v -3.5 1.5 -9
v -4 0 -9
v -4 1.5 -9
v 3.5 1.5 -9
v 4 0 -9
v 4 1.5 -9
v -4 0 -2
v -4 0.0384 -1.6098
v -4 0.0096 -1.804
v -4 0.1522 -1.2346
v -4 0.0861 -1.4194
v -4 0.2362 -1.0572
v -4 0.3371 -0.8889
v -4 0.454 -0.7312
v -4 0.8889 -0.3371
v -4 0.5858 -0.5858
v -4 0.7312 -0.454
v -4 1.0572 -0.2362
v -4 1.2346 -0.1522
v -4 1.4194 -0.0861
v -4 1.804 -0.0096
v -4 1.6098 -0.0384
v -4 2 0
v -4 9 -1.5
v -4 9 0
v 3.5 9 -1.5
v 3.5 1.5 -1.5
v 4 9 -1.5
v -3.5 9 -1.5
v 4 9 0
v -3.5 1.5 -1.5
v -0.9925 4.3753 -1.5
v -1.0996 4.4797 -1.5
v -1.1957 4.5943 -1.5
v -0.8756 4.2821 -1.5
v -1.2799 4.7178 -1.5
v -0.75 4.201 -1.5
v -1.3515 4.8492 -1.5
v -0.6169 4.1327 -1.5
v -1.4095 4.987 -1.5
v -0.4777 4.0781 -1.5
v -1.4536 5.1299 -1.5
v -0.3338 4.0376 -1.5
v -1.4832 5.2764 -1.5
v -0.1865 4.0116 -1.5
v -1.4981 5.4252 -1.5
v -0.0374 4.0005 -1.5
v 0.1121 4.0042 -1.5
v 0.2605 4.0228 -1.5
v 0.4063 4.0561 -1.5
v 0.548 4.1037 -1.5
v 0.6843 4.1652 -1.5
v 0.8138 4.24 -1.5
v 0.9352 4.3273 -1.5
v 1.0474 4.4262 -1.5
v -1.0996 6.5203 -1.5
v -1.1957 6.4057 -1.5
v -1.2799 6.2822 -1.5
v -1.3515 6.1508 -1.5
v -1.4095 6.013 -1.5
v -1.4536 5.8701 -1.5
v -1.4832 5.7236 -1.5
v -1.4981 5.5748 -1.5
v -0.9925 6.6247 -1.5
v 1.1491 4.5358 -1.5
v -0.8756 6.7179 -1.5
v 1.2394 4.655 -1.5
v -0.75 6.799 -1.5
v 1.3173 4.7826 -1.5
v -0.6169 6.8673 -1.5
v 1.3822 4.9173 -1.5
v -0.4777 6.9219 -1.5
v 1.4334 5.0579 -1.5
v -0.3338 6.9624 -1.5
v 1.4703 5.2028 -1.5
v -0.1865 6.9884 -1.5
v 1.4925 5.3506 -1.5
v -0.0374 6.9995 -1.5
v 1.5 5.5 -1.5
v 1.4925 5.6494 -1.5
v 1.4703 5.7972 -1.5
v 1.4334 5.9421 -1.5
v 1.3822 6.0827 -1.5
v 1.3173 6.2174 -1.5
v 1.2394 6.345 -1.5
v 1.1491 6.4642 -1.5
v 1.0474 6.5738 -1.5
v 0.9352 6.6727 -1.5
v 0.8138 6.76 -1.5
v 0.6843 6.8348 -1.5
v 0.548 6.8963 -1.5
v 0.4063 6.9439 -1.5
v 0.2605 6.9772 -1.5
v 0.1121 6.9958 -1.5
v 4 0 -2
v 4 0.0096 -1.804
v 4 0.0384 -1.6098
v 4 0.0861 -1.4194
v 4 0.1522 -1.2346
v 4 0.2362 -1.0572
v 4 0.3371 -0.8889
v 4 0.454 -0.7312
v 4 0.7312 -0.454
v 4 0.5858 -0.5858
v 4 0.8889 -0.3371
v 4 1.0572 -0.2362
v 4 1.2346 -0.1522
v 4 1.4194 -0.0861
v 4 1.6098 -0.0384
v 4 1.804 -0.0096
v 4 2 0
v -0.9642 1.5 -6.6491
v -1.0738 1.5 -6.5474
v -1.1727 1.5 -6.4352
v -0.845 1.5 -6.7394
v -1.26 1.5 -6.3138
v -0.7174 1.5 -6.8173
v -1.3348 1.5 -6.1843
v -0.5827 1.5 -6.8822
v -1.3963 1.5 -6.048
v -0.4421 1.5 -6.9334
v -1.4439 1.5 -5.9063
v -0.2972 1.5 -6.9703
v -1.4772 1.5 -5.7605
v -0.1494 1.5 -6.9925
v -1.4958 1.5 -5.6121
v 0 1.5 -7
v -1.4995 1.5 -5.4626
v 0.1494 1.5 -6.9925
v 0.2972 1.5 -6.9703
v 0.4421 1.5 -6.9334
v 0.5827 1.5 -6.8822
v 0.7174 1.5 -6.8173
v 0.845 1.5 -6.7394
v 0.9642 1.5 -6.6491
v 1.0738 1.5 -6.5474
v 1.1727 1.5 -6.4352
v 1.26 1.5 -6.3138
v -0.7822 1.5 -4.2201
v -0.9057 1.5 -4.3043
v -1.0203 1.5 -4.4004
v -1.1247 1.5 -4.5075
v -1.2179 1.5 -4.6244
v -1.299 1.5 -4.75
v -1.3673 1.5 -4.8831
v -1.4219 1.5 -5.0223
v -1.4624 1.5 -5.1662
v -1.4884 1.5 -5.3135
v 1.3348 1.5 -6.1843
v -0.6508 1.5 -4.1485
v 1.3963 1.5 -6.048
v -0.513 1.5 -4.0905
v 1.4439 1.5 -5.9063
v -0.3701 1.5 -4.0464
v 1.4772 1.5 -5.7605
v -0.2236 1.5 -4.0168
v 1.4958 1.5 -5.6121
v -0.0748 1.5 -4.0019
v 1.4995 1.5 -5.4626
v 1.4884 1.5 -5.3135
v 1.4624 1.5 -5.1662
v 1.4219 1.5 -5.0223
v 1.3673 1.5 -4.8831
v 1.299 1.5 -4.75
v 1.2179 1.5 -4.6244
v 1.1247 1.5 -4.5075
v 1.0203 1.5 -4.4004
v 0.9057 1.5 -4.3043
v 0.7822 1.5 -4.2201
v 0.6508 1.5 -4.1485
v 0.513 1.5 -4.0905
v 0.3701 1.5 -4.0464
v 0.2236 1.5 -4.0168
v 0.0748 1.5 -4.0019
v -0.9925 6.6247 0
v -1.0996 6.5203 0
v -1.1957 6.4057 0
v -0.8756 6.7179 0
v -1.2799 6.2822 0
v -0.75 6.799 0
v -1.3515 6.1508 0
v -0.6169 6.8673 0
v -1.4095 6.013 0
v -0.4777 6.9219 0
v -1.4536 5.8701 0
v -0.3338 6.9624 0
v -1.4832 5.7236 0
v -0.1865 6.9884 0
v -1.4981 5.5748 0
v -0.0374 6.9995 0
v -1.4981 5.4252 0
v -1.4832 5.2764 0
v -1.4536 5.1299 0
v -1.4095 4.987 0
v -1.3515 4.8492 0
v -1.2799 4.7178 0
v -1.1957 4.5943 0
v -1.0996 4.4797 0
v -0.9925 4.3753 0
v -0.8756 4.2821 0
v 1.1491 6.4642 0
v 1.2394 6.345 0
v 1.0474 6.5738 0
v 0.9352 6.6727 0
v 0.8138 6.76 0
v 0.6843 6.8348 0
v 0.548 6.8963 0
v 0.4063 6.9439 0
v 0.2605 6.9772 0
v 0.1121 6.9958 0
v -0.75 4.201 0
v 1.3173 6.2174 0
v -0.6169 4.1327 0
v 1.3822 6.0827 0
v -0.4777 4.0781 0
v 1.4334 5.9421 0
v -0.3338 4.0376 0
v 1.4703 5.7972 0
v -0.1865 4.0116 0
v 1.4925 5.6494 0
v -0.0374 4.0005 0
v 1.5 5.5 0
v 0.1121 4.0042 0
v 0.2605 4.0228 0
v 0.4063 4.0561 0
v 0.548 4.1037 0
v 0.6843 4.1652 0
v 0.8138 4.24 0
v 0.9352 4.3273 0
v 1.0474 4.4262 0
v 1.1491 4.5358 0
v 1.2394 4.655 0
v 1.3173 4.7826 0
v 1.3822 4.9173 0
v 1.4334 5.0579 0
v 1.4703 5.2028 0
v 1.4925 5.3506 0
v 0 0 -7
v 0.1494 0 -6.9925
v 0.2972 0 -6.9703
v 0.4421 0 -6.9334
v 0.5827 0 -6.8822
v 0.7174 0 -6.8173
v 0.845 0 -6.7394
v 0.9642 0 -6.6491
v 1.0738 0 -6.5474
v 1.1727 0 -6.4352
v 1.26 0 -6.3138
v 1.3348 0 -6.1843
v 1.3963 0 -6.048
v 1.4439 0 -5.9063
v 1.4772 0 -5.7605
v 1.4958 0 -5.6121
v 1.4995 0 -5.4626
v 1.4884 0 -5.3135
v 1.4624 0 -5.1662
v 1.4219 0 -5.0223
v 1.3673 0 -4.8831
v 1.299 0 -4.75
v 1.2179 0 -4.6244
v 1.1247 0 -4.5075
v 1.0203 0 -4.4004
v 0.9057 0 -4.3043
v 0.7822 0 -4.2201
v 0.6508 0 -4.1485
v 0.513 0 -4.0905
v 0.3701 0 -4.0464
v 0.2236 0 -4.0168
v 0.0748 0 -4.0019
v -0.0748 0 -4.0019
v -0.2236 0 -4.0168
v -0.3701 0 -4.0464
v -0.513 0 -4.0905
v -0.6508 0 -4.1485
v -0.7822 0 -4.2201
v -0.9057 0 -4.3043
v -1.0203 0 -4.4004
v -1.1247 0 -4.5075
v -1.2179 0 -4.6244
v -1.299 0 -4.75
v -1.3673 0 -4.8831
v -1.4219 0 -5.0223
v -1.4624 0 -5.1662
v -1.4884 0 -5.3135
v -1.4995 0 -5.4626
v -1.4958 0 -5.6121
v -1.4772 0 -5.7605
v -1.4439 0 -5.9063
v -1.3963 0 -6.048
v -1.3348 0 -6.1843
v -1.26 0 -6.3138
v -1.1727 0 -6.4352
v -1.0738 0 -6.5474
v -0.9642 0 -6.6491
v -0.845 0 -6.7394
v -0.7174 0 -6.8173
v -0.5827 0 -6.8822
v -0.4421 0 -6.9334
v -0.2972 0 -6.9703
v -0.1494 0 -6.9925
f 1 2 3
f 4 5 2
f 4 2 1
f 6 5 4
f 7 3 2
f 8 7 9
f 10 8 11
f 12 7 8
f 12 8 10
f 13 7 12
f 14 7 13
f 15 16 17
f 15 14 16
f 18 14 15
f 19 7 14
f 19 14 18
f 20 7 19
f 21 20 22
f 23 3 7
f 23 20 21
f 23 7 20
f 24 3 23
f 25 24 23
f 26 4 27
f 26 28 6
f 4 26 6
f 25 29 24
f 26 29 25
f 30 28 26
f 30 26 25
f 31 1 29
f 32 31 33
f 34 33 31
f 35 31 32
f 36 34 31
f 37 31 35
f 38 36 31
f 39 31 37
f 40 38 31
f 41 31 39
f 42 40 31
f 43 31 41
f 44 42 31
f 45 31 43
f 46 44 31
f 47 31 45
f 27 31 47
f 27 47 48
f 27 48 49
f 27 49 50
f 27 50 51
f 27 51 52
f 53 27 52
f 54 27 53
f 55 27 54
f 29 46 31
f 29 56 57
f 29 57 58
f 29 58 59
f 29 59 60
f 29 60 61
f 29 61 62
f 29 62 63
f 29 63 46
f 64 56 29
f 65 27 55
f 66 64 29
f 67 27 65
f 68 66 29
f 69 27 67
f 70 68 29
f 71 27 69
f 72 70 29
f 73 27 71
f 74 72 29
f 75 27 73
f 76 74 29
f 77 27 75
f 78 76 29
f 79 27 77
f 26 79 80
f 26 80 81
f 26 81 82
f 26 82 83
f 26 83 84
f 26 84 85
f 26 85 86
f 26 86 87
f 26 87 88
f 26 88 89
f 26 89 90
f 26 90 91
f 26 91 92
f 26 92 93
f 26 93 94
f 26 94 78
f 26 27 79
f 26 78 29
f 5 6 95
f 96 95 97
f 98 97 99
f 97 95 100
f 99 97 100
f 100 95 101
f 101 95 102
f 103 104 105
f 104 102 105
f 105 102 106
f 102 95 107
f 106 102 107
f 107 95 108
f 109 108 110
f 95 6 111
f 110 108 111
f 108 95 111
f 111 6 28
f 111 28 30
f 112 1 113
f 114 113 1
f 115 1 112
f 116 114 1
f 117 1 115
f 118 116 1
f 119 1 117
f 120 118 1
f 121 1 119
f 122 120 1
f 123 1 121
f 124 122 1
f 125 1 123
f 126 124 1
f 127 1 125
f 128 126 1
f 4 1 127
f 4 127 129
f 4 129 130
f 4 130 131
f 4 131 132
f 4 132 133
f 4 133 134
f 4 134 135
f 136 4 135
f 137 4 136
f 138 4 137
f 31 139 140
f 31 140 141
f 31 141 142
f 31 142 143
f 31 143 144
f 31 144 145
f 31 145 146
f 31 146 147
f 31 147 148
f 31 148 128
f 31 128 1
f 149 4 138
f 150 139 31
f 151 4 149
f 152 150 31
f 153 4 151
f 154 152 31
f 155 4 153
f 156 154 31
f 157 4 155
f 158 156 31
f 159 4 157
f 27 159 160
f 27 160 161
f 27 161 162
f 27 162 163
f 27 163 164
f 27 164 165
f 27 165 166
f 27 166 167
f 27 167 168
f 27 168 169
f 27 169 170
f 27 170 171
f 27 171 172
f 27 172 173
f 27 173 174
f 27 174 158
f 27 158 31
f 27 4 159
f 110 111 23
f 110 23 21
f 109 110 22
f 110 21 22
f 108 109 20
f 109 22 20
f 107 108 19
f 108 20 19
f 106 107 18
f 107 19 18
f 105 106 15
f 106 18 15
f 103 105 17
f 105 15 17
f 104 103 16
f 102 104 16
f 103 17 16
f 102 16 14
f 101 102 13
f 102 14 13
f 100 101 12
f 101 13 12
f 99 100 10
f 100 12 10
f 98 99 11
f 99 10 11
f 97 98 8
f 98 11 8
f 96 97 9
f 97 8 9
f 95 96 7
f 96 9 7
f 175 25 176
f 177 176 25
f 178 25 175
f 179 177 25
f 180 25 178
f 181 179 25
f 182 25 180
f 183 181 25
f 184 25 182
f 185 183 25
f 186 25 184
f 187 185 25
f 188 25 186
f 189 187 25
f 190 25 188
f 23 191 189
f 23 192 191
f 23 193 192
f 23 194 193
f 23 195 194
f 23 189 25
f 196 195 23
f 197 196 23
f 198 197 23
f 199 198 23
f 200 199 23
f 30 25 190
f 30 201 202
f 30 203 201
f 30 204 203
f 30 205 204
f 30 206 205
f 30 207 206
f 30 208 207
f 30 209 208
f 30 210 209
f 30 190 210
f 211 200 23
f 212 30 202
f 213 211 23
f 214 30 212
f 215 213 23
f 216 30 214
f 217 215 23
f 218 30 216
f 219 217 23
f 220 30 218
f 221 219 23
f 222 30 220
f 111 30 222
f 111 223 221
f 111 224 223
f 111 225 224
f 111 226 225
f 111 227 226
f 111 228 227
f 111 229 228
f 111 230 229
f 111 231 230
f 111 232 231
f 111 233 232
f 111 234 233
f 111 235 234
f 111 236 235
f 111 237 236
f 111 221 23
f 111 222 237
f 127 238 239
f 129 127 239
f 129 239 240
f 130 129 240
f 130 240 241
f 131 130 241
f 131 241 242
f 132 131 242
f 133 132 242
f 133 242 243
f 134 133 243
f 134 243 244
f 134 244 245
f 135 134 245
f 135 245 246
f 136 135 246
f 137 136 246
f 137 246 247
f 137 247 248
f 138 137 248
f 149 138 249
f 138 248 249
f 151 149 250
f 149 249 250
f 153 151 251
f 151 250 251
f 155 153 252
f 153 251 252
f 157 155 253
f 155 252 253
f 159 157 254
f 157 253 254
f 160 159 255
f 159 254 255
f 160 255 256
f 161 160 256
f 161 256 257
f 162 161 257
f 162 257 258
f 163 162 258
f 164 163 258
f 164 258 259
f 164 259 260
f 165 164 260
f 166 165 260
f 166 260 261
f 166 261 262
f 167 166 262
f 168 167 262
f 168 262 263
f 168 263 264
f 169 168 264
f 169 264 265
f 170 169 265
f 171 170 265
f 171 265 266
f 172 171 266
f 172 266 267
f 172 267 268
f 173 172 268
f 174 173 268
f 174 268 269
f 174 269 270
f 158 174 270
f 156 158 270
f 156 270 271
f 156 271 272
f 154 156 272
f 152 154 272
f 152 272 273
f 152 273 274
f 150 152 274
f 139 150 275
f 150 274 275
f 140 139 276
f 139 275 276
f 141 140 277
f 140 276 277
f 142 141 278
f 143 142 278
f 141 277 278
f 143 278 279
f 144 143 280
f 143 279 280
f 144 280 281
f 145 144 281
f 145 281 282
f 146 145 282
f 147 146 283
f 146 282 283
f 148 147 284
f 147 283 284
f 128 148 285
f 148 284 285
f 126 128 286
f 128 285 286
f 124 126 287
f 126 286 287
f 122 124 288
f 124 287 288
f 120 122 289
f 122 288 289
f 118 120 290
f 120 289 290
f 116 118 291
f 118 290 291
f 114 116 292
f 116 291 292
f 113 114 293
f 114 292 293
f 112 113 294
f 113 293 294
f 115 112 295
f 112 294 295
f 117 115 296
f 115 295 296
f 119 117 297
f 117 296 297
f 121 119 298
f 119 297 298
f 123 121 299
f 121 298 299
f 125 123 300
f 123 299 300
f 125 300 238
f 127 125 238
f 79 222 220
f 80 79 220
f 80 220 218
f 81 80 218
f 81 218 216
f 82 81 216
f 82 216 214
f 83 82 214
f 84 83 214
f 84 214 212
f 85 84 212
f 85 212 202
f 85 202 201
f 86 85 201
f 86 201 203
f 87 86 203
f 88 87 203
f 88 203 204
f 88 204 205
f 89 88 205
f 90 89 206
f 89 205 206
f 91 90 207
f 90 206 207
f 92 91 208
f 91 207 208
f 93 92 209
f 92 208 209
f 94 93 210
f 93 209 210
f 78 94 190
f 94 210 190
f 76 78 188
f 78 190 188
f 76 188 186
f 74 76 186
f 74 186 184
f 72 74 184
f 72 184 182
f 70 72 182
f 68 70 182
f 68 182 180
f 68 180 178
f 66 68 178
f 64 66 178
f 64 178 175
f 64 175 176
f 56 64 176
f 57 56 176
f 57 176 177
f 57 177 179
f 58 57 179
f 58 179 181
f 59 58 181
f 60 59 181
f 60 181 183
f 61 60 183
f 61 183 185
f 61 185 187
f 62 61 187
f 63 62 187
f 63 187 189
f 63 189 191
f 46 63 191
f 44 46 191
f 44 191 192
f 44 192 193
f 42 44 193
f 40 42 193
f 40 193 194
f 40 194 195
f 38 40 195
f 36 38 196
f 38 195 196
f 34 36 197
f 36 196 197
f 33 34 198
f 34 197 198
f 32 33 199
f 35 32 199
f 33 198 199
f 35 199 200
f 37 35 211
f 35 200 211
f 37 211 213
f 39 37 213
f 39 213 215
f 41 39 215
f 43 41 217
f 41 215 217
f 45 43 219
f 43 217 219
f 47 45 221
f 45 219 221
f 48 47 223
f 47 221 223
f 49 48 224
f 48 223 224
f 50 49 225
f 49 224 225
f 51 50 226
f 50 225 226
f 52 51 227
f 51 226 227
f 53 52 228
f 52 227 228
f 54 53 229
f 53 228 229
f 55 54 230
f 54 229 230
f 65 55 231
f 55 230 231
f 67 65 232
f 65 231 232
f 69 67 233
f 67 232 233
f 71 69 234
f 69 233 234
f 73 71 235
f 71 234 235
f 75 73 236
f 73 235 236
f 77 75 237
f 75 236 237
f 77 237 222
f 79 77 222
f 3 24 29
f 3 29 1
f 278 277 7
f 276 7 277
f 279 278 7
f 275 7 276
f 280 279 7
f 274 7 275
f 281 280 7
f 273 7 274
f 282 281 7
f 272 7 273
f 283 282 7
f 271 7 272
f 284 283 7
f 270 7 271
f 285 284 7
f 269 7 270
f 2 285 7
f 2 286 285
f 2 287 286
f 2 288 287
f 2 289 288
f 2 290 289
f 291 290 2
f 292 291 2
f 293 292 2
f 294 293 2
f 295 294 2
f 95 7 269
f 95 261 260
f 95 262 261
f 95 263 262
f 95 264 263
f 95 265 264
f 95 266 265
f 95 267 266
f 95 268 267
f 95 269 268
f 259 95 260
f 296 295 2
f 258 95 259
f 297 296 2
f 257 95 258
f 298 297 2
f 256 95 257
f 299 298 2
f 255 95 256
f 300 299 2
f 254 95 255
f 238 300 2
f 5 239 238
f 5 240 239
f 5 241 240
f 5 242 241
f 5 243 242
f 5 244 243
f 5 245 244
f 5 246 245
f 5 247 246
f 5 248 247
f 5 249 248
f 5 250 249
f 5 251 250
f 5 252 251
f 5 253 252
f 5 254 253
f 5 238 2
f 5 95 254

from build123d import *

# Parameters (mm, degrees)
BOSS_EXTRUDE1_DEPTH = 4
BOSS_EXTRUDE2_DEPTH = 0.5
SKETCH3_R           = 1.5
CUT_EXTRUDE1_DEPTH  = 14.341664064
SKETCH4_R           = 1.5
CUT_EXTRUDE2_DEPTH  = 14.341664064
FILLET1_R           = 2


with BuildPart() as part:
    # Sketch1 → Boss-Extrude1 (new, symmetric)
    with BuildSketch(Plane(origin=(0, 0, 0), x_dir=(0, 0, -1), z_dir=(1, 0, 0))):
        Polygon((0, 1.664846908), (0, 0), (1.75206606, 0), (9, 0), (9, 1.5), (1.5, 1.5), (1.5, 9), (0, 9), align=None)
    extrude(amount=BOSS_EXTRUDE1_DEPTH, both=True)

    # Sketch2 → Boss-Extrude2 (add)
    with BuildSketch(Plane(origin=(4, 0, 0), x_dir=(0, 0, -1), z_dir=(1, 0, 0))):
        Polygon((1.5, 9), (9, 1.5), (1.5, 1.5), align=None)
    boss_extrude2 = extrude(amount=-BOSS_EXTRUDE2_DEPTH)

    # Mirror1: Boss-Extrude2 across plane
    add(boss_extrude2.mirror(Plane(origin=(0, 0, 0), x_dir=(0, 0, 1), z_dir=(1, 0, 0))))

    # Sketch3 → Cut-Extrude1 (cut, through all)
    with BuildSketch(Plane.XY):
        with Locations((0, 5.5)):
            Circle(SKETCH3_R)
    extrude(amount=-CUT_EXTRUDE1_DEPTH, mode=Mode.SUBTRACT)

    # Sketch4 → Cut-Extrude2 (cut, through all)
    with BuildSketch(Plane.XZ):
        with Locations(Location((0, -5.5, 0), (0, 0, 270))):
            Circle(SKETCH4_R)
    extrude(amount=-CUT_EXTRUDE2_DEPTH, mode=Mode.SUBTRACT)

    # Fillet1
    fillet1_edges = [part.edges().sort_by_distance(p)[0] for p in [
        (0, 0, 0),
    ]]
    fillet(fillet1_edges, radius=FILLET1_R)


solid = part.part
